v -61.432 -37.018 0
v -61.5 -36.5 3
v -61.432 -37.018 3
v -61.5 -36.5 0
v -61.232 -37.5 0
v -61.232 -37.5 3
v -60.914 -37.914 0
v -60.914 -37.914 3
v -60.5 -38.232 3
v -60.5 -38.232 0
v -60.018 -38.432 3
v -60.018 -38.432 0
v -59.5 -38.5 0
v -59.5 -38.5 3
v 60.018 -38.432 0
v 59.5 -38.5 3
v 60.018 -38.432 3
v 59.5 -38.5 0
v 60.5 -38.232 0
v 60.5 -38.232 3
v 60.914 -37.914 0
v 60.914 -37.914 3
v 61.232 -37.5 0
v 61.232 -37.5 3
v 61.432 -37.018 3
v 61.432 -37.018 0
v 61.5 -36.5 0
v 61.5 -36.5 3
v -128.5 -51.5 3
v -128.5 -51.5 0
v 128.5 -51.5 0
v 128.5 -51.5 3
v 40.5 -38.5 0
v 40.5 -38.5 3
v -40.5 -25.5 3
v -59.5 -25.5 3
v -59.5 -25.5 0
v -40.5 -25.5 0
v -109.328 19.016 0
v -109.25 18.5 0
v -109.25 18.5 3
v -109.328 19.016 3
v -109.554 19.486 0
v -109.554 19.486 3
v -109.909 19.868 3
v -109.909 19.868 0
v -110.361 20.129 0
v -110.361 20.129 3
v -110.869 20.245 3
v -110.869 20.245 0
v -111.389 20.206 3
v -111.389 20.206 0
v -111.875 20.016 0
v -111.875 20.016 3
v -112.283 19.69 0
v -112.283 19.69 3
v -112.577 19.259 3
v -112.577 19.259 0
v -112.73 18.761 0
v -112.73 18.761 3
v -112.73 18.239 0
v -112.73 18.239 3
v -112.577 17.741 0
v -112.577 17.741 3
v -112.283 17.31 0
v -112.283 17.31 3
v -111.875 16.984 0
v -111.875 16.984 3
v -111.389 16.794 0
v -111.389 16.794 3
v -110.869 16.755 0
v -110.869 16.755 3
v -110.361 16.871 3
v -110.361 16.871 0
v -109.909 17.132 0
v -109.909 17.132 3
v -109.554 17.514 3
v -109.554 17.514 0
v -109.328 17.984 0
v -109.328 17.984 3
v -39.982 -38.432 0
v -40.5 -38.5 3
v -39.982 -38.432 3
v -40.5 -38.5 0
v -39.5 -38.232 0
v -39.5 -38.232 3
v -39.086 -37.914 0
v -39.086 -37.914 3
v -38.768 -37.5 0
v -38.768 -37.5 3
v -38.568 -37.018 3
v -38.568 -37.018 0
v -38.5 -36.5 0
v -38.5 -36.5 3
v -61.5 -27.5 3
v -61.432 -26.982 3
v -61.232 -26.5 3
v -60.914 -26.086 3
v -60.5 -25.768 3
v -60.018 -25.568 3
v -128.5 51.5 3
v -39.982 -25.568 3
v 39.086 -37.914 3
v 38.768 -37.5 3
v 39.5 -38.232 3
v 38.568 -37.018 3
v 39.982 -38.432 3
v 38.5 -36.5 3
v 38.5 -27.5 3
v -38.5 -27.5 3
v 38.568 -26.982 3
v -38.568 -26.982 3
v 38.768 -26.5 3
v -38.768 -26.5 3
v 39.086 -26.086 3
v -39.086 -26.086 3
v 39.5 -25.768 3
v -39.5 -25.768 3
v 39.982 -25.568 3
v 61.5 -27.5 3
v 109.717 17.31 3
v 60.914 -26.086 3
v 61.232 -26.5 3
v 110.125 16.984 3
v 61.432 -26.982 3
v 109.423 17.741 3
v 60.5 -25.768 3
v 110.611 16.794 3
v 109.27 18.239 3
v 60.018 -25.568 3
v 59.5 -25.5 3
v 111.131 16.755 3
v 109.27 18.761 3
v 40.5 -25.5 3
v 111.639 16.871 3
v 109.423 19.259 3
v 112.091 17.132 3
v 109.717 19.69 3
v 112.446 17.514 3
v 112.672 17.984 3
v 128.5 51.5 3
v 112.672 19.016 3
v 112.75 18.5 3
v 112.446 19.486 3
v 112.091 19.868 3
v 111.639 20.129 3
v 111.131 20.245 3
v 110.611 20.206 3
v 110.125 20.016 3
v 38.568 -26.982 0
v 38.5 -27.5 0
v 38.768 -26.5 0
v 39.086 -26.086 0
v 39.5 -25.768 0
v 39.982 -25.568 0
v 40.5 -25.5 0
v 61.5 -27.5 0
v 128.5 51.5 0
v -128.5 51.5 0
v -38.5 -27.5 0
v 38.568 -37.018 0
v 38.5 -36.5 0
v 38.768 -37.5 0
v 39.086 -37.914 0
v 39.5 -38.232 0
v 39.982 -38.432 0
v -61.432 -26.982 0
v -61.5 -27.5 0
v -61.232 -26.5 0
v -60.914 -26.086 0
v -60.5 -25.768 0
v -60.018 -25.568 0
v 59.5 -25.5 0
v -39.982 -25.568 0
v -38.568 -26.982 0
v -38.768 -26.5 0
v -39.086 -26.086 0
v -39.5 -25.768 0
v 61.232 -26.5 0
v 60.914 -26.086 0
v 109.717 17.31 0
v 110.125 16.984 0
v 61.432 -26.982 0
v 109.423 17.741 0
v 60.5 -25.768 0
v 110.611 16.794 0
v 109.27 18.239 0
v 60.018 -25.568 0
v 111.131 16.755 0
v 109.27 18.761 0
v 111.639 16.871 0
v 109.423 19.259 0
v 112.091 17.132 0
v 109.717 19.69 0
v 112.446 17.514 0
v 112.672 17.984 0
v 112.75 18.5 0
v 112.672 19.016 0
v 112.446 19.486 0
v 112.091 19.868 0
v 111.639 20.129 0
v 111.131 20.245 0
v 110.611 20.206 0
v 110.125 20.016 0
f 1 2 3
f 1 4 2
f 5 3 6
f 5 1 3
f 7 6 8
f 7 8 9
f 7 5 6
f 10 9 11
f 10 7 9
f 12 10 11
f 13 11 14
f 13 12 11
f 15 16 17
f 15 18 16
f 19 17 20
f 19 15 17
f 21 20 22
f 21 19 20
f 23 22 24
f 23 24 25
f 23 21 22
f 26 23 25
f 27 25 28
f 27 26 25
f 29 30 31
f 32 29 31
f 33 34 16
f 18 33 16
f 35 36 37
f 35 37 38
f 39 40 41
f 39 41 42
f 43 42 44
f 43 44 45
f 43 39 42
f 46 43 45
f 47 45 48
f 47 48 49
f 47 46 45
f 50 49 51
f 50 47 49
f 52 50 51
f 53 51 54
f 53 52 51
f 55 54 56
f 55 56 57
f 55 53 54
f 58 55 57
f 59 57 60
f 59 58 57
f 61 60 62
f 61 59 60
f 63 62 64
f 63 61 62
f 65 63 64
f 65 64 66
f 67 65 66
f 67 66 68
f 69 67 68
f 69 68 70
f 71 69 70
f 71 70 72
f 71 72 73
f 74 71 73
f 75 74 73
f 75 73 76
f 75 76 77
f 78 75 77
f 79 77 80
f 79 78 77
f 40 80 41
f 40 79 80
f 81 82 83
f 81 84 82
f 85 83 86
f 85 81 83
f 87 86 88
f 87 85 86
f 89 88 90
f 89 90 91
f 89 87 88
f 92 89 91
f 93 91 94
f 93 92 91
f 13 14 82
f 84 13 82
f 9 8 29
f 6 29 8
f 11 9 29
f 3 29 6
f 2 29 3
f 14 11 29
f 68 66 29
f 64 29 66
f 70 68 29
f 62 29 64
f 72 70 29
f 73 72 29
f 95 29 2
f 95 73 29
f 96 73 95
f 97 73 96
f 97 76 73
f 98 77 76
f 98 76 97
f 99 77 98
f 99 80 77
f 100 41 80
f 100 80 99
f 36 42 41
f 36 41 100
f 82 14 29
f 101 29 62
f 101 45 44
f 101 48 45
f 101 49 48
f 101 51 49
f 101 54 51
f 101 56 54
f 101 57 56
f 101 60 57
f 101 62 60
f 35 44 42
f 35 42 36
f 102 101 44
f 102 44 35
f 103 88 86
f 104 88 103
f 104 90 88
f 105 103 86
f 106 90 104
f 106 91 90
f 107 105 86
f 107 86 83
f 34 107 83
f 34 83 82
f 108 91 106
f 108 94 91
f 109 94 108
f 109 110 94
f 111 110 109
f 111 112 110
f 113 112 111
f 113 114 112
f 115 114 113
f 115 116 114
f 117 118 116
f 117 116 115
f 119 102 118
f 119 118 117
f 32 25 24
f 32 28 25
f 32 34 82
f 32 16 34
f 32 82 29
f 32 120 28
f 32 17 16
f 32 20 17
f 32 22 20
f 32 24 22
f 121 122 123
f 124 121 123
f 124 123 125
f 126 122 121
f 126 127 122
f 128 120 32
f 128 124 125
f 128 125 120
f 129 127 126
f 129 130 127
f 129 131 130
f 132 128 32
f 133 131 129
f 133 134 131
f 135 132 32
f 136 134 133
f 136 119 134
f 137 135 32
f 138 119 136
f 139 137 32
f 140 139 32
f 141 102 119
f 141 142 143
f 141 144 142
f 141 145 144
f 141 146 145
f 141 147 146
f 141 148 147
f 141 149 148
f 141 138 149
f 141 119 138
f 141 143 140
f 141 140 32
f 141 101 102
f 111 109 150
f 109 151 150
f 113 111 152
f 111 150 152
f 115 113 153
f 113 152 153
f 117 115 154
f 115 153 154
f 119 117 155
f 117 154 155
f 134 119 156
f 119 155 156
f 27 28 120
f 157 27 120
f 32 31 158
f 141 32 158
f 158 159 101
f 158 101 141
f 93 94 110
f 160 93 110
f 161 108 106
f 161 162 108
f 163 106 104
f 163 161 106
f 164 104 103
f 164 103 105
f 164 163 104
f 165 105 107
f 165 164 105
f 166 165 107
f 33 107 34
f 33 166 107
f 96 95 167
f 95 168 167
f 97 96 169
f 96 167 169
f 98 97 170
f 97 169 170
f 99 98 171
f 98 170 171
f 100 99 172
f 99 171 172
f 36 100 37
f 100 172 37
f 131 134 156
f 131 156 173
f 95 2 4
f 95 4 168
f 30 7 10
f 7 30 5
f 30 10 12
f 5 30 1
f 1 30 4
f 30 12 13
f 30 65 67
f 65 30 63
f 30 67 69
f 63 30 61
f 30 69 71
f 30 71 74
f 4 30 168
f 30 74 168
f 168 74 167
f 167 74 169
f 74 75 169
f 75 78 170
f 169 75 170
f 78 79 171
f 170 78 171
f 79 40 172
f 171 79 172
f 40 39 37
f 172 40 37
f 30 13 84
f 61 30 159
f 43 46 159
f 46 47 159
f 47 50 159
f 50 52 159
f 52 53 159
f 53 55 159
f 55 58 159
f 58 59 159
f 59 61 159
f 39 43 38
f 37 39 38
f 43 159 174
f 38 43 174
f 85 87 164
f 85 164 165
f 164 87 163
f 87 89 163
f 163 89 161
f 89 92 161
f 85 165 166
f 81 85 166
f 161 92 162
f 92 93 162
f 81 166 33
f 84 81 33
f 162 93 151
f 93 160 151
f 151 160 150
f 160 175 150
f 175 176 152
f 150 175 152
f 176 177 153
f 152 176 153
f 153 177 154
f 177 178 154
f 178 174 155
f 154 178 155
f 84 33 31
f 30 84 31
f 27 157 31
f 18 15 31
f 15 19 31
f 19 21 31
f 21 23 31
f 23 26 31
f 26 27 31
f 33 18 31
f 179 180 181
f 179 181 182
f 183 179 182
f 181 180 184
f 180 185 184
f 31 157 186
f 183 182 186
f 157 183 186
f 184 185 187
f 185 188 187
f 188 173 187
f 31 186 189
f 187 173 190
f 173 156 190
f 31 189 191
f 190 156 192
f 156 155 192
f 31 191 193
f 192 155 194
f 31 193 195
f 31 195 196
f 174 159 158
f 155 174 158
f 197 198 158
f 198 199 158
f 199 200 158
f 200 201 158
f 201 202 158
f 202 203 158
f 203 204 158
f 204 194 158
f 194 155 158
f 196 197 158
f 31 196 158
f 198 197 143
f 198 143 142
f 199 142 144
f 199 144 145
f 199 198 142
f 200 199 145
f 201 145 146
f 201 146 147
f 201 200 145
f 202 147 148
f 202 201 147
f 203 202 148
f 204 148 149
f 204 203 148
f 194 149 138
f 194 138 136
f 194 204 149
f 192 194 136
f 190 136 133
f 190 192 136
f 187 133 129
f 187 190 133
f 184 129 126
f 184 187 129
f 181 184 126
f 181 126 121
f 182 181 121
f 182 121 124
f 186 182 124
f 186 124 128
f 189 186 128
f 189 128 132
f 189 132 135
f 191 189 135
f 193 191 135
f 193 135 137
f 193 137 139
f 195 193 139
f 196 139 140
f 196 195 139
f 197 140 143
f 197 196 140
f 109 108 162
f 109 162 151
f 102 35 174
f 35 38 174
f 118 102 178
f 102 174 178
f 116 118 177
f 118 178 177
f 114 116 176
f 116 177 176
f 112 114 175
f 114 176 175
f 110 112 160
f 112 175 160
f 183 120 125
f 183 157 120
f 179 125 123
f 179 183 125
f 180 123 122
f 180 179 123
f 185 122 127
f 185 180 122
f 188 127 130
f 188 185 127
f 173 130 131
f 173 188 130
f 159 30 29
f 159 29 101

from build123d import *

# Parameters (mm, degrees)
ESQUISSE1_W             = 257
ESQUISSE1_H             = 103
ESQUISSE1_R             = 1.75
BOSS_EXTRU_1_DEPTH      = 3
ENL_V_MAT_EXTRU_1_REACH = 5
ESQUISSE2_W             = 23
ESQUISSE2_H             = 13
CONG_1_R                = 2


with BuildPart() as part:
    # Esquisse1 → Boss.-Extru.1 (new body)
    with BuildSketch(Plane.XY):
        Rectangle(ESQUISSE1_W, ESQUISSE1_H)
        with Locations((-111, 18.5)):
            Circle(ESQUISSE1_R, mode=Mode.SUBTRACT)
        with Locations((111, 18.5)):
            Circle(ESQUISSE1_R, mode=Mode.SUBTRACT)
    extrude(amount=BOSS_EXTRU_1_DEPTH)

    # Esquisse2 → Enlèv. mat.-Extru.1 (cut, up to next)
    with BuildSketch(Plane.XY.offset(3), mode=Mode.PRIVATE) as enl_v_mat_extru_1_sk1:
        with Locations((-50, -32)):
            Rectangle(ESQUISSE2_W, ESQUISSE2_H)
    enl_v_mat_extru_1_tool1 = extrude(enl_v_mat_extru_1_sk1.sketch, amount=-ENL_V_MAT_EXTRU_1_REACH, mode=Mode.PRIVATE) & part.part
    add(enl_v_mat_extru_1_tool1.solids().sort_by_distance((-50, -32, 3))[0], mode=Mode.SUBTRACT)
    # Esquisse2 → Enlèv. mat.-Extru.1 (cut, up to next)
    with BuildSketch(Plane.XY.offset(3), mode=Mode.PRIVATE) as enl_v_mat_extru_1_sk2:
        with Locations((50, -32)):
            Rectangle(ESQUISSE2_W, ESQUISSE2_H)
    enl_v_mat_extru_1_tool2 = extrude(enl_v_mat_extru_1_sk2.sketch, amount=-ENL_V_MAT_EXTRU_1_REACH, mode=Mode.PRIVATE) & part.part
    add(enl_v_mat_extru_1_tool2.solids().sort_by_distance((50, -32, 3))[0], mode=Mode.SUBTRACT)

    # Congé1
    cong_1_edges = [part.edges().sort_by_distance(p)[0] for p in [
        (-61.5, -38.5, 1.5),
        (-61.5, -25.5, 1.5),
        (-38.5, -25.5, 1.5),
        (-38.5, -38.5, 1.5),
        (38.5, -38.5, 1.5),
        (38.5, -25.5, 1.5),
        (61.5, -25.5, 1.5),
        (61.5, -38.5, 1.5),
    ]]
    fillet(cong_1_edges, radius=CONG_1_R)


solid = part.part
